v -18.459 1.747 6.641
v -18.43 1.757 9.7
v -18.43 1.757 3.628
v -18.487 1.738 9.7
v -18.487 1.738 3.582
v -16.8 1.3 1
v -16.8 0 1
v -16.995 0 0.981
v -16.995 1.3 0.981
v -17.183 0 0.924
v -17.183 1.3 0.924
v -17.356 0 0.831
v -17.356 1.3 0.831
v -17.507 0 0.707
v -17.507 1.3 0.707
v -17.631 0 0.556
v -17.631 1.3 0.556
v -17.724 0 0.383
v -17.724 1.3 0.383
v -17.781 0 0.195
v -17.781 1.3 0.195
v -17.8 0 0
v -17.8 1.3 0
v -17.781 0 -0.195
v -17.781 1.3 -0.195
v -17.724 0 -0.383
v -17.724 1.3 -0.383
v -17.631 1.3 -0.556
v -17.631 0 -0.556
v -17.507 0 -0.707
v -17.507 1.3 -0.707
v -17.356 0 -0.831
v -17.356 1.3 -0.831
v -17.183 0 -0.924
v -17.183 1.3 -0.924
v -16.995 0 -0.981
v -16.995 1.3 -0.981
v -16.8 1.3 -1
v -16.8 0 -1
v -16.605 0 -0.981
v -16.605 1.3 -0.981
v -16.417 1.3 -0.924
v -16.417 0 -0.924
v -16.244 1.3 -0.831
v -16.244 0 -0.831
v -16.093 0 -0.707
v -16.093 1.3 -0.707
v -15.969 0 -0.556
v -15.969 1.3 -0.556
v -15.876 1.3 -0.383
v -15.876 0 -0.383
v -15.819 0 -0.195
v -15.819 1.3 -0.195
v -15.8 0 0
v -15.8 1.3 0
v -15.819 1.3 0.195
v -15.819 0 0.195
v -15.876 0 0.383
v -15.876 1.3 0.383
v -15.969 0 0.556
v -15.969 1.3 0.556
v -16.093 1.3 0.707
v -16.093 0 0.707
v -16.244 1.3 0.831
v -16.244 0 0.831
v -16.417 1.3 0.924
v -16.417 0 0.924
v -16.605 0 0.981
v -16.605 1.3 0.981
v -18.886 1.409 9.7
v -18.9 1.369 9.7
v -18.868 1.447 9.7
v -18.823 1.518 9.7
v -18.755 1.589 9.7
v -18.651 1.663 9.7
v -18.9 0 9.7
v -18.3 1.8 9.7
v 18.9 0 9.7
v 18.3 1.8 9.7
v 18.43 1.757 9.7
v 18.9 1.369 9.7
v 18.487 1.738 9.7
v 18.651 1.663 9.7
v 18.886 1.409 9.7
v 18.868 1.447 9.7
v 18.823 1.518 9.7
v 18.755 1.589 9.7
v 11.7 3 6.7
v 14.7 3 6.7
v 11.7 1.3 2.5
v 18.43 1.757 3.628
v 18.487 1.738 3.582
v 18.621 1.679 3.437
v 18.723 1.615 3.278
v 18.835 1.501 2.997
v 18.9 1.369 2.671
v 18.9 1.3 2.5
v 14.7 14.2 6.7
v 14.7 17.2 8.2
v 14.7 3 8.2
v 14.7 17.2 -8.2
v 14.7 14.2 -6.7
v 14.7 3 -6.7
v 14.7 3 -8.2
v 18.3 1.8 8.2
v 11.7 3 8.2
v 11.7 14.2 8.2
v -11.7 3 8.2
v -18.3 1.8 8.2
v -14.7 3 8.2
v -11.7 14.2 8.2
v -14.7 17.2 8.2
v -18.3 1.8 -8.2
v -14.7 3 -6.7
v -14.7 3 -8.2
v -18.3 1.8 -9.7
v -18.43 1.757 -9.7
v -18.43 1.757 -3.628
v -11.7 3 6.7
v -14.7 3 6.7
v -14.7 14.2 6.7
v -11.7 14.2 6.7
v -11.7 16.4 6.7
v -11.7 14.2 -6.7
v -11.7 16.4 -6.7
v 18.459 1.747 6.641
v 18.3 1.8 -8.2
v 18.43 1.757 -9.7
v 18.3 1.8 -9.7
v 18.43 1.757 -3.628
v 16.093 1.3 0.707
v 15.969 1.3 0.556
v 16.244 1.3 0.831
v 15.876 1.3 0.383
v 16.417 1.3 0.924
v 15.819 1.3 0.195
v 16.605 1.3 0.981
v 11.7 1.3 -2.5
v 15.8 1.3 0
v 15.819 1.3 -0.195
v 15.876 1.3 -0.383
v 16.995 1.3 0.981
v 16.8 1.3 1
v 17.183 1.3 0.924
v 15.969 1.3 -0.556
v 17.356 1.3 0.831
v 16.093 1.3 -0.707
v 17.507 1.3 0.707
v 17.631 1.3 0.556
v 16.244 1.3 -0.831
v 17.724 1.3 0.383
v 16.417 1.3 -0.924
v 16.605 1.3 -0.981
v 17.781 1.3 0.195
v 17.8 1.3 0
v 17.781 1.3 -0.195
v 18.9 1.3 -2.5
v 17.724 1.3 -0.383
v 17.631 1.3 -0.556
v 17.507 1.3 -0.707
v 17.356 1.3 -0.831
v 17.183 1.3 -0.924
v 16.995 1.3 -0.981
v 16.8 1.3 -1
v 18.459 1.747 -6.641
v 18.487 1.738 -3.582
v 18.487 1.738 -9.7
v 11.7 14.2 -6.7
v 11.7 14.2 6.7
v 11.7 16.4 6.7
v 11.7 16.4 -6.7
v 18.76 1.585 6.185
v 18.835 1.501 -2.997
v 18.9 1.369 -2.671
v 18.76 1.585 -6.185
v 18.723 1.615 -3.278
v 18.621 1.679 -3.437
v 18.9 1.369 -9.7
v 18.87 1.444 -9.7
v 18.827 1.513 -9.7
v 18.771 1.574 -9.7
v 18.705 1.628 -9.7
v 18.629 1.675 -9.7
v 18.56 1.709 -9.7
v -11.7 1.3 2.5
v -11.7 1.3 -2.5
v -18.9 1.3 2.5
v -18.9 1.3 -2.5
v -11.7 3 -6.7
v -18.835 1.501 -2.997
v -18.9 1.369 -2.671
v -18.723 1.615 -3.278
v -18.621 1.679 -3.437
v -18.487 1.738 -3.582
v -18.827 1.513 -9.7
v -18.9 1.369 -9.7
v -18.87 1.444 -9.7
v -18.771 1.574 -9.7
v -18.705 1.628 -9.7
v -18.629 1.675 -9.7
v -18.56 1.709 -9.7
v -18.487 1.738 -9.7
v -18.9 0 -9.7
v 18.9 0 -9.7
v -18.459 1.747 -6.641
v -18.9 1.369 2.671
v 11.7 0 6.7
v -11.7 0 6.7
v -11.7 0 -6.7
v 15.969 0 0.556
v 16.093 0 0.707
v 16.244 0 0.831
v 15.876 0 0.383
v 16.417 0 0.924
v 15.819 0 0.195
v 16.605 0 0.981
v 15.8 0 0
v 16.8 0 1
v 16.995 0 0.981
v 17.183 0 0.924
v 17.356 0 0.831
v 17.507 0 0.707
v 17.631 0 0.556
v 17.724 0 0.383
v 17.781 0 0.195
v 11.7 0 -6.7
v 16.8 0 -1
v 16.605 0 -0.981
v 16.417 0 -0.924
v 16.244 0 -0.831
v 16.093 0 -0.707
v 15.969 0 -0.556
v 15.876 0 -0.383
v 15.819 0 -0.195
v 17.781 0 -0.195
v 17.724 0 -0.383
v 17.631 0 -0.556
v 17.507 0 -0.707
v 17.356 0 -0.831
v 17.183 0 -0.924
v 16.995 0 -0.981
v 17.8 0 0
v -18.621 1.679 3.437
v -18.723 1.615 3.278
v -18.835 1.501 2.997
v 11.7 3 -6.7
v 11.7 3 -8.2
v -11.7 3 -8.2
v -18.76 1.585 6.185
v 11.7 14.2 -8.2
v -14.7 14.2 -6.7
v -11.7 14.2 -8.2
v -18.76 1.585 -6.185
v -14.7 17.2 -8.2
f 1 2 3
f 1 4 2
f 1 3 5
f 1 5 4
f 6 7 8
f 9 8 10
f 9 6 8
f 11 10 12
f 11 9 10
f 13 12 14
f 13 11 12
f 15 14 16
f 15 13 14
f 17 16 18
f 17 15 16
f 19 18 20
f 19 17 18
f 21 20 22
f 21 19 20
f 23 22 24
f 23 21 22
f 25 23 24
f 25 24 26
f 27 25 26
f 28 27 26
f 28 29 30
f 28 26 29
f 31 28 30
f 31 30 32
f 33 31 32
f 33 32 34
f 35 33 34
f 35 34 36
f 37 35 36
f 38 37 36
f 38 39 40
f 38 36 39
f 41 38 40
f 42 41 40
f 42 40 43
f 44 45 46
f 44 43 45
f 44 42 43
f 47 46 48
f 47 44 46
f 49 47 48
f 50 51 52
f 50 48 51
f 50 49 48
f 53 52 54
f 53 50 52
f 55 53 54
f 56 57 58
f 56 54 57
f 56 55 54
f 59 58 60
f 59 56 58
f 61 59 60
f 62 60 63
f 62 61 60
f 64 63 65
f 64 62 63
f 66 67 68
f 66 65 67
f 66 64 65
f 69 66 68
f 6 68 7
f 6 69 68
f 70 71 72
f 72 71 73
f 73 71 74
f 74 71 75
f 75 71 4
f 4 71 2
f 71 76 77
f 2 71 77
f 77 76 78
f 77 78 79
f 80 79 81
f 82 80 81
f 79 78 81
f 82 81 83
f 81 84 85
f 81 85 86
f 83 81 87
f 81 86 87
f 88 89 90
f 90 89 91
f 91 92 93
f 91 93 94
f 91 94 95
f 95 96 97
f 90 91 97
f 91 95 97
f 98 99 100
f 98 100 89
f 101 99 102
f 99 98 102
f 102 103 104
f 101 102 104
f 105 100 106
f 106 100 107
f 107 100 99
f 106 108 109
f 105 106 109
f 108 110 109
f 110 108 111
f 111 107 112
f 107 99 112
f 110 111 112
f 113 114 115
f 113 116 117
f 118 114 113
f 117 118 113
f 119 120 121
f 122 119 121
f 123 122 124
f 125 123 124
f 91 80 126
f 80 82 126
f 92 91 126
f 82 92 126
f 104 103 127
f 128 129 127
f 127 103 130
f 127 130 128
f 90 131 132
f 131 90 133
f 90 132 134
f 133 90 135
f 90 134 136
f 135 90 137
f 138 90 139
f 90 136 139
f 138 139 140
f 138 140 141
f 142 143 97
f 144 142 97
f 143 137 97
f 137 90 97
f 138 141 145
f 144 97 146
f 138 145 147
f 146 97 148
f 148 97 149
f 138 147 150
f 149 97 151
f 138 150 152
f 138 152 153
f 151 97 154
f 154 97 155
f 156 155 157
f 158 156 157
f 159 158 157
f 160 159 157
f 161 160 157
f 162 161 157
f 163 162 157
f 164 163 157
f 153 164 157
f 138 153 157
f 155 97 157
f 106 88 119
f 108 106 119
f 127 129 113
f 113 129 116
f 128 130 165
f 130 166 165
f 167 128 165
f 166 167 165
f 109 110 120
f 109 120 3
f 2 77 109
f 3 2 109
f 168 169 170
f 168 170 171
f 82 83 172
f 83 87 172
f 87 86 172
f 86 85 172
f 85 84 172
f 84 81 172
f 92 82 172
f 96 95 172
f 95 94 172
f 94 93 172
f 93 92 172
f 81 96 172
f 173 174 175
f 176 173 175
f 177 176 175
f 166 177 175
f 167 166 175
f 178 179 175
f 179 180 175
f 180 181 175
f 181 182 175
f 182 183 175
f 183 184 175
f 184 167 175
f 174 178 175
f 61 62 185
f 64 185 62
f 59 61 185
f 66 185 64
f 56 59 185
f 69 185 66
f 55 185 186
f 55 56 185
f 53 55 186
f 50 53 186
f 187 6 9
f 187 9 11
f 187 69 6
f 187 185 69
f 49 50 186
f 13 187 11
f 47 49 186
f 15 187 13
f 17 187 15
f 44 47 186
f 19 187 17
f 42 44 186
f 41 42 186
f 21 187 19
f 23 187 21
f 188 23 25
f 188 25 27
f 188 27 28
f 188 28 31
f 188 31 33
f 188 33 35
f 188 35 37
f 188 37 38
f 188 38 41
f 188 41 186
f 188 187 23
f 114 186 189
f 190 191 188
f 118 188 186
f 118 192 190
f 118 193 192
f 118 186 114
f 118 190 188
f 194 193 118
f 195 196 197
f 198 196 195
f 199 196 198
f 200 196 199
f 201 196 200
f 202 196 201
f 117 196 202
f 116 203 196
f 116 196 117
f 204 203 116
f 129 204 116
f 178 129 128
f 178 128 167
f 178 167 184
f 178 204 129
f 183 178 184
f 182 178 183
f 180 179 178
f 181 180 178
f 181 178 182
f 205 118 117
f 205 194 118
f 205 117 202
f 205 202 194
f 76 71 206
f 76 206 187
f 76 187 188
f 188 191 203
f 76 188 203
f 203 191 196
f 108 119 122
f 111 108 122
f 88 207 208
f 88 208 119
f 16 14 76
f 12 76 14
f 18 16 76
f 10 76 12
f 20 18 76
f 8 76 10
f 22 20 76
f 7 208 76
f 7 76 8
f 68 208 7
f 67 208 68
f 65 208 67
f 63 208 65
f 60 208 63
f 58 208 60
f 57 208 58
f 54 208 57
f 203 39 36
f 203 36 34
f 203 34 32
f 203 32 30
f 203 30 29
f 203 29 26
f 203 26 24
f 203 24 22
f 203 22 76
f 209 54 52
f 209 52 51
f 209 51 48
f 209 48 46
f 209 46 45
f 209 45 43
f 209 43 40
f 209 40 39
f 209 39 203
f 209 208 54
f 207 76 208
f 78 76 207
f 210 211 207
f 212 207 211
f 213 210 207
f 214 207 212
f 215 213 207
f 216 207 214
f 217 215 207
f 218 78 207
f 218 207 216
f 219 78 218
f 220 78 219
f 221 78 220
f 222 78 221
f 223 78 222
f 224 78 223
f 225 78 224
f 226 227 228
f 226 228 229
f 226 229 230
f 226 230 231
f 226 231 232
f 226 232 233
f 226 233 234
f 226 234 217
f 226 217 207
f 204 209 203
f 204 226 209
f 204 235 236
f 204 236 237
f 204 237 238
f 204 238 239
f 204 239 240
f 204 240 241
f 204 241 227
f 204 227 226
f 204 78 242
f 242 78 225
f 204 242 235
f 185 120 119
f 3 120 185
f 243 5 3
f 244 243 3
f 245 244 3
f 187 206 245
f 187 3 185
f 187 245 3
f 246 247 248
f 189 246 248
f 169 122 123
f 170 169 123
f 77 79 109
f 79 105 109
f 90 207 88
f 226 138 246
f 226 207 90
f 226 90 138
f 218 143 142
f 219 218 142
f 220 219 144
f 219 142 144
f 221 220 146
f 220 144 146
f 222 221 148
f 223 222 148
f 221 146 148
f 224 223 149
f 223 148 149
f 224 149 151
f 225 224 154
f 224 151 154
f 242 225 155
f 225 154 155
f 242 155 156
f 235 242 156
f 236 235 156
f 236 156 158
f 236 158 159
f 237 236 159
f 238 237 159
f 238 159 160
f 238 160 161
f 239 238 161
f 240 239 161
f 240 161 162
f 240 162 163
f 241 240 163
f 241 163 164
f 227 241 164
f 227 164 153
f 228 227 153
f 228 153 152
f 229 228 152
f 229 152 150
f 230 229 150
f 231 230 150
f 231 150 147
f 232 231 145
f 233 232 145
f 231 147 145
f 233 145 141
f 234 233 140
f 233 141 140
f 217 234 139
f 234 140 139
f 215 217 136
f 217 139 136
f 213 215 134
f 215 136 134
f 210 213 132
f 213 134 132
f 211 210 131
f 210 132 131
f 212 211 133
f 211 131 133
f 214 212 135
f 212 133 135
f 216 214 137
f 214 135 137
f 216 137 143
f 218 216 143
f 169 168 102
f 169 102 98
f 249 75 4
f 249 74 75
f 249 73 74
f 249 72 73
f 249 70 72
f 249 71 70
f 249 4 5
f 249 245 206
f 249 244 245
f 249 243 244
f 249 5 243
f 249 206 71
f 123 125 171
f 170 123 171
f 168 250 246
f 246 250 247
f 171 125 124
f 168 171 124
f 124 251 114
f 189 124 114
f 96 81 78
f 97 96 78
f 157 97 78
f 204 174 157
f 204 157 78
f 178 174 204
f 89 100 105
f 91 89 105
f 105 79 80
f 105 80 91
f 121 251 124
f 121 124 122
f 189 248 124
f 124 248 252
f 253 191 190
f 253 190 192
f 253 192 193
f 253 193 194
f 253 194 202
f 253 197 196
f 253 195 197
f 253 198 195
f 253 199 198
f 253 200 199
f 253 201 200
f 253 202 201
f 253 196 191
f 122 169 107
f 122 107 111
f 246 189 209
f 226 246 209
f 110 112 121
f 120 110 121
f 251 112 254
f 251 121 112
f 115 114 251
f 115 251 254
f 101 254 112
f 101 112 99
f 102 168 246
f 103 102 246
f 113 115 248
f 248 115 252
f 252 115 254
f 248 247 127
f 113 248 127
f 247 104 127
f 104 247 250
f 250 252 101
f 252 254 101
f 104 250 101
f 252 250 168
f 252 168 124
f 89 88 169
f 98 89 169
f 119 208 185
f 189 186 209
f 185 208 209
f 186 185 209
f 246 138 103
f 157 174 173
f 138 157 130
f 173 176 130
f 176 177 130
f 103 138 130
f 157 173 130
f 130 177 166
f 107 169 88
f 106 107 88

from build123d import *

# Parameters (mm, degrees)
SKETCH_1_W          = 29.4
SKETCH_1_H          = 19.4
SKETCH_1_W_2        = 23.4
SKETCH_1_H_2        = 13.4
EXTRUDE_1_DEPTH     = 16.4
SKETCH_2_W          = 29.4
SKETCH_2_H          = 19.4
EXTRUDE_2_DEPTH     = 0.8
SKETCH_7_W          = 13.4
SKETCH_7_H          = 5.6
CUT_EXTRUDE_2_DEPTH = 30
SKETCH_8_W          = 23.4
SKETCH_8_H          = 5.6
CUT_EXTRUDE_3_DEPTH = 30
SKETCH_9_W          = 19.4
SKETCH_9_H          = 3
EXTRUDE_5_DEPTH     = 4.2
CUT_EXTRUDE_4_DEPTH = 20.2
CUT_EXTRUDE_5_DEPTH = 5.1
SKETCH_12_R         = 1
CUT_EXTRUDE_6_DEPTH = 2.2
CUT_EXTRUDE_7_DEPTH = 15.4


with BuildPart() as part:
    # 草图1 → 凸台-拉伸1 (new body)
    with BuildSketch(Plane(origin=(0, 0, 0), x_dir=(1, 0, 0), z_dir=(0, 1, 0))):
        Rectangle(SKETCH_1_W, SKETCH_1_H)
        Rectangle(SKETCH_1_W_2, SKETCH_1_H_2, mode=Mode.SUBTRACT)
    extrude(amount=EXTRUDE_1_DEPTH)

    # 草图2 → 凸台-拉伸2 (add)
    with BuildSketch(Plane(origin=(0, 16.4, 0), x_dir=(1, 0, 0), z_dir=(0, 1, 0))):
        Rectangle(SKETCH_2_W, SKETCH_2_H)
    extrude(amount=EXTRUDE_2_DEPTH)

    # 草图7 → 切除-拉伸2 (cut)
    with BuildSketch(Plane.ZY.offset(14.7)):
        with Locations((0, 11.4)):
            Rectangle(SKETCH_7_W, SKETCH_7_H)
        with Locations((0, 5.8)):
            Rectangle(SKETCH_7_W, SKETCH_7_H)
    extrude(amount=-CUT_EXTRUDE_2_DEPTH, mode=Mode.SUBTRACT)

    # 草图8 → 切除-拉伸3 (cut)
    with BuildSketch(Plane(origin=(0, 0, -9.7), x_dir=(-1, 0, 0), z_dir=(0, 0, -1))):
        with Locations((0, 11.4)):
            Rectangle(SKETCH_8_W, SKETCH_8_H)
        with Locations((0, 5.8)):
            Rectangle(SKETCH_8_W, SKETCH_8_H)
    extrude(amount=-CUT_EXTRUDE_3_DEPTH, mode=Mode.SUBTRACT)

    # 草图9 → 凸台-拉伸5 (add)
    with BuildSketch(Plane(origin=(14.7, 0, 0), x_dir=(0, 0, -1), z_dir=(1, 0, 0))):
        with Locations((0, 1.5)):
            Rectangle(SKETCH_9_W, SKETCH_9_H)
    extrude_5 = extrude(amount=EXTRUDE_5_DEPTH)

    # 草图10 → 切除-拉伸4 (cut)
    with BuildSketch(Plane.XY.offset(9.7)):
        with BuildLine():
            add(Edge.make_bspline(
                [(18.486644801, 1.737785066), (18.825886074, 1.616028978), (18.9, 1.36920832)],
                knots=[0.049557912, 0.049557912, 0.049557912, 0.659174515, 0.659174515, 0.659174515], degree=2))
            Line((18.9, 1.36920832), (18.9, 1.6))
            Line((18.9, 1.6), (18.9, 3))
            Line((18.9, 3), (14.7, 3))
            Line((14.7, 3), (18.429736397, 1.756754534))
            add(Edge.make_bspline(
                [(18.429736397, 1.756754534), (18.459066665, 1.747683054), (18.486644801, 1.737785066)],
                knots=[0, 0, 0, 0.049557912, 0.049557912, 0.049557912], degree=2))
        make_face()
    cut_extrude_4 = extrude(amount=-CUT_EXTRUDE_4_DEPTH, mode=Mode.SUBTRACT)

    # 草图11 → 切除-拉伸5 (cut, symmetric)
    with BuildSketch(Plane(origin=(14.7, 0, 0), x_dir=(0, 0, -1), z_dir=(1, 0, 0))):
        Polygon((2.5, 1.3), (6.7, 3), (-6.7, 3), (-2.5, 1.3), align=None)
    cut_extrude_5 = extrude(amount=CUT_EXTRUDE_5_DEPTH, both=True, mode=Mode.SUBTRACT)

    # 草图12 → 切除-拉伸6 (cut)
    with BuildSketch(Plane(origin=(0, 1.3, 0), x_dir=(1, 0, 0), z_dir=(0, 1, 0))):
        with Locations(Location((16.8, 0, 0), (0, 0, 270))):
            Circle(SKETCH_12_R)
    cut_extrude_6 = extrude(amount=-CUT_EXTRUDE_6_DEPTH, mode=Mode.SUBTRACT)

    # 镜向1: 凸台-拉伸5, 切除-拉伸4, 切除-拉伸5, 切除-拉伸6 across plane
    add(extrude_5.mirror(Plane(origin=(0, 0, 0), x_dir=(0, 0, 1), z_dir=(1, 0, 0))))
    add(cut_extrude_4.mirror(Plane(origin=(0, 0, 0), x_dir=(0, 0, 1), z_dir=(1, 0, 0))), mode=Mode.SUBTRACT)
    add(cut_extrude_5.mirror(Plane(origin=(0, 0, 0), x_dir=(0, 0, 1), z_dir=(1, 0, 0))), mode=Mode.SUBTRACT)
    add(cut_extrude_6.mirror(Plane(origin=(0, 0, 0), x_dir=(0, 0, 1), z_dir=(1, 0, 0))), mode=Mode.SUBTRACT)

    # 草图13 → 切除-拉伸7 (cut)
    with BuildSketch(Plane(origin=(0, 17.2, 0), x_dir=(1, 0, 0), z_dir=(0, 1, 0))):
        Polygon((-14.7, 9.7), (14.7, 9.7), (18.9, 9.7), (18.9, 8.2), (14.7, 8.2), (-14.7, 8.2), (-18.9, 8.2), (-18.9, 9.7), align=None)
        Polygon((14.7, -9.7), (-14.7, -9.7), (-18.9, -9.7), (-18.9, -8.2), (-14.7, -8.2), (14.7, -8.2), (18.9, -8.2), (18.9, -9.7), align=None)
    extrude(amount=-CUT_EXTRUDE_7_DEPTH, mode=Mode.SUBTRACT)


solid = part.part
